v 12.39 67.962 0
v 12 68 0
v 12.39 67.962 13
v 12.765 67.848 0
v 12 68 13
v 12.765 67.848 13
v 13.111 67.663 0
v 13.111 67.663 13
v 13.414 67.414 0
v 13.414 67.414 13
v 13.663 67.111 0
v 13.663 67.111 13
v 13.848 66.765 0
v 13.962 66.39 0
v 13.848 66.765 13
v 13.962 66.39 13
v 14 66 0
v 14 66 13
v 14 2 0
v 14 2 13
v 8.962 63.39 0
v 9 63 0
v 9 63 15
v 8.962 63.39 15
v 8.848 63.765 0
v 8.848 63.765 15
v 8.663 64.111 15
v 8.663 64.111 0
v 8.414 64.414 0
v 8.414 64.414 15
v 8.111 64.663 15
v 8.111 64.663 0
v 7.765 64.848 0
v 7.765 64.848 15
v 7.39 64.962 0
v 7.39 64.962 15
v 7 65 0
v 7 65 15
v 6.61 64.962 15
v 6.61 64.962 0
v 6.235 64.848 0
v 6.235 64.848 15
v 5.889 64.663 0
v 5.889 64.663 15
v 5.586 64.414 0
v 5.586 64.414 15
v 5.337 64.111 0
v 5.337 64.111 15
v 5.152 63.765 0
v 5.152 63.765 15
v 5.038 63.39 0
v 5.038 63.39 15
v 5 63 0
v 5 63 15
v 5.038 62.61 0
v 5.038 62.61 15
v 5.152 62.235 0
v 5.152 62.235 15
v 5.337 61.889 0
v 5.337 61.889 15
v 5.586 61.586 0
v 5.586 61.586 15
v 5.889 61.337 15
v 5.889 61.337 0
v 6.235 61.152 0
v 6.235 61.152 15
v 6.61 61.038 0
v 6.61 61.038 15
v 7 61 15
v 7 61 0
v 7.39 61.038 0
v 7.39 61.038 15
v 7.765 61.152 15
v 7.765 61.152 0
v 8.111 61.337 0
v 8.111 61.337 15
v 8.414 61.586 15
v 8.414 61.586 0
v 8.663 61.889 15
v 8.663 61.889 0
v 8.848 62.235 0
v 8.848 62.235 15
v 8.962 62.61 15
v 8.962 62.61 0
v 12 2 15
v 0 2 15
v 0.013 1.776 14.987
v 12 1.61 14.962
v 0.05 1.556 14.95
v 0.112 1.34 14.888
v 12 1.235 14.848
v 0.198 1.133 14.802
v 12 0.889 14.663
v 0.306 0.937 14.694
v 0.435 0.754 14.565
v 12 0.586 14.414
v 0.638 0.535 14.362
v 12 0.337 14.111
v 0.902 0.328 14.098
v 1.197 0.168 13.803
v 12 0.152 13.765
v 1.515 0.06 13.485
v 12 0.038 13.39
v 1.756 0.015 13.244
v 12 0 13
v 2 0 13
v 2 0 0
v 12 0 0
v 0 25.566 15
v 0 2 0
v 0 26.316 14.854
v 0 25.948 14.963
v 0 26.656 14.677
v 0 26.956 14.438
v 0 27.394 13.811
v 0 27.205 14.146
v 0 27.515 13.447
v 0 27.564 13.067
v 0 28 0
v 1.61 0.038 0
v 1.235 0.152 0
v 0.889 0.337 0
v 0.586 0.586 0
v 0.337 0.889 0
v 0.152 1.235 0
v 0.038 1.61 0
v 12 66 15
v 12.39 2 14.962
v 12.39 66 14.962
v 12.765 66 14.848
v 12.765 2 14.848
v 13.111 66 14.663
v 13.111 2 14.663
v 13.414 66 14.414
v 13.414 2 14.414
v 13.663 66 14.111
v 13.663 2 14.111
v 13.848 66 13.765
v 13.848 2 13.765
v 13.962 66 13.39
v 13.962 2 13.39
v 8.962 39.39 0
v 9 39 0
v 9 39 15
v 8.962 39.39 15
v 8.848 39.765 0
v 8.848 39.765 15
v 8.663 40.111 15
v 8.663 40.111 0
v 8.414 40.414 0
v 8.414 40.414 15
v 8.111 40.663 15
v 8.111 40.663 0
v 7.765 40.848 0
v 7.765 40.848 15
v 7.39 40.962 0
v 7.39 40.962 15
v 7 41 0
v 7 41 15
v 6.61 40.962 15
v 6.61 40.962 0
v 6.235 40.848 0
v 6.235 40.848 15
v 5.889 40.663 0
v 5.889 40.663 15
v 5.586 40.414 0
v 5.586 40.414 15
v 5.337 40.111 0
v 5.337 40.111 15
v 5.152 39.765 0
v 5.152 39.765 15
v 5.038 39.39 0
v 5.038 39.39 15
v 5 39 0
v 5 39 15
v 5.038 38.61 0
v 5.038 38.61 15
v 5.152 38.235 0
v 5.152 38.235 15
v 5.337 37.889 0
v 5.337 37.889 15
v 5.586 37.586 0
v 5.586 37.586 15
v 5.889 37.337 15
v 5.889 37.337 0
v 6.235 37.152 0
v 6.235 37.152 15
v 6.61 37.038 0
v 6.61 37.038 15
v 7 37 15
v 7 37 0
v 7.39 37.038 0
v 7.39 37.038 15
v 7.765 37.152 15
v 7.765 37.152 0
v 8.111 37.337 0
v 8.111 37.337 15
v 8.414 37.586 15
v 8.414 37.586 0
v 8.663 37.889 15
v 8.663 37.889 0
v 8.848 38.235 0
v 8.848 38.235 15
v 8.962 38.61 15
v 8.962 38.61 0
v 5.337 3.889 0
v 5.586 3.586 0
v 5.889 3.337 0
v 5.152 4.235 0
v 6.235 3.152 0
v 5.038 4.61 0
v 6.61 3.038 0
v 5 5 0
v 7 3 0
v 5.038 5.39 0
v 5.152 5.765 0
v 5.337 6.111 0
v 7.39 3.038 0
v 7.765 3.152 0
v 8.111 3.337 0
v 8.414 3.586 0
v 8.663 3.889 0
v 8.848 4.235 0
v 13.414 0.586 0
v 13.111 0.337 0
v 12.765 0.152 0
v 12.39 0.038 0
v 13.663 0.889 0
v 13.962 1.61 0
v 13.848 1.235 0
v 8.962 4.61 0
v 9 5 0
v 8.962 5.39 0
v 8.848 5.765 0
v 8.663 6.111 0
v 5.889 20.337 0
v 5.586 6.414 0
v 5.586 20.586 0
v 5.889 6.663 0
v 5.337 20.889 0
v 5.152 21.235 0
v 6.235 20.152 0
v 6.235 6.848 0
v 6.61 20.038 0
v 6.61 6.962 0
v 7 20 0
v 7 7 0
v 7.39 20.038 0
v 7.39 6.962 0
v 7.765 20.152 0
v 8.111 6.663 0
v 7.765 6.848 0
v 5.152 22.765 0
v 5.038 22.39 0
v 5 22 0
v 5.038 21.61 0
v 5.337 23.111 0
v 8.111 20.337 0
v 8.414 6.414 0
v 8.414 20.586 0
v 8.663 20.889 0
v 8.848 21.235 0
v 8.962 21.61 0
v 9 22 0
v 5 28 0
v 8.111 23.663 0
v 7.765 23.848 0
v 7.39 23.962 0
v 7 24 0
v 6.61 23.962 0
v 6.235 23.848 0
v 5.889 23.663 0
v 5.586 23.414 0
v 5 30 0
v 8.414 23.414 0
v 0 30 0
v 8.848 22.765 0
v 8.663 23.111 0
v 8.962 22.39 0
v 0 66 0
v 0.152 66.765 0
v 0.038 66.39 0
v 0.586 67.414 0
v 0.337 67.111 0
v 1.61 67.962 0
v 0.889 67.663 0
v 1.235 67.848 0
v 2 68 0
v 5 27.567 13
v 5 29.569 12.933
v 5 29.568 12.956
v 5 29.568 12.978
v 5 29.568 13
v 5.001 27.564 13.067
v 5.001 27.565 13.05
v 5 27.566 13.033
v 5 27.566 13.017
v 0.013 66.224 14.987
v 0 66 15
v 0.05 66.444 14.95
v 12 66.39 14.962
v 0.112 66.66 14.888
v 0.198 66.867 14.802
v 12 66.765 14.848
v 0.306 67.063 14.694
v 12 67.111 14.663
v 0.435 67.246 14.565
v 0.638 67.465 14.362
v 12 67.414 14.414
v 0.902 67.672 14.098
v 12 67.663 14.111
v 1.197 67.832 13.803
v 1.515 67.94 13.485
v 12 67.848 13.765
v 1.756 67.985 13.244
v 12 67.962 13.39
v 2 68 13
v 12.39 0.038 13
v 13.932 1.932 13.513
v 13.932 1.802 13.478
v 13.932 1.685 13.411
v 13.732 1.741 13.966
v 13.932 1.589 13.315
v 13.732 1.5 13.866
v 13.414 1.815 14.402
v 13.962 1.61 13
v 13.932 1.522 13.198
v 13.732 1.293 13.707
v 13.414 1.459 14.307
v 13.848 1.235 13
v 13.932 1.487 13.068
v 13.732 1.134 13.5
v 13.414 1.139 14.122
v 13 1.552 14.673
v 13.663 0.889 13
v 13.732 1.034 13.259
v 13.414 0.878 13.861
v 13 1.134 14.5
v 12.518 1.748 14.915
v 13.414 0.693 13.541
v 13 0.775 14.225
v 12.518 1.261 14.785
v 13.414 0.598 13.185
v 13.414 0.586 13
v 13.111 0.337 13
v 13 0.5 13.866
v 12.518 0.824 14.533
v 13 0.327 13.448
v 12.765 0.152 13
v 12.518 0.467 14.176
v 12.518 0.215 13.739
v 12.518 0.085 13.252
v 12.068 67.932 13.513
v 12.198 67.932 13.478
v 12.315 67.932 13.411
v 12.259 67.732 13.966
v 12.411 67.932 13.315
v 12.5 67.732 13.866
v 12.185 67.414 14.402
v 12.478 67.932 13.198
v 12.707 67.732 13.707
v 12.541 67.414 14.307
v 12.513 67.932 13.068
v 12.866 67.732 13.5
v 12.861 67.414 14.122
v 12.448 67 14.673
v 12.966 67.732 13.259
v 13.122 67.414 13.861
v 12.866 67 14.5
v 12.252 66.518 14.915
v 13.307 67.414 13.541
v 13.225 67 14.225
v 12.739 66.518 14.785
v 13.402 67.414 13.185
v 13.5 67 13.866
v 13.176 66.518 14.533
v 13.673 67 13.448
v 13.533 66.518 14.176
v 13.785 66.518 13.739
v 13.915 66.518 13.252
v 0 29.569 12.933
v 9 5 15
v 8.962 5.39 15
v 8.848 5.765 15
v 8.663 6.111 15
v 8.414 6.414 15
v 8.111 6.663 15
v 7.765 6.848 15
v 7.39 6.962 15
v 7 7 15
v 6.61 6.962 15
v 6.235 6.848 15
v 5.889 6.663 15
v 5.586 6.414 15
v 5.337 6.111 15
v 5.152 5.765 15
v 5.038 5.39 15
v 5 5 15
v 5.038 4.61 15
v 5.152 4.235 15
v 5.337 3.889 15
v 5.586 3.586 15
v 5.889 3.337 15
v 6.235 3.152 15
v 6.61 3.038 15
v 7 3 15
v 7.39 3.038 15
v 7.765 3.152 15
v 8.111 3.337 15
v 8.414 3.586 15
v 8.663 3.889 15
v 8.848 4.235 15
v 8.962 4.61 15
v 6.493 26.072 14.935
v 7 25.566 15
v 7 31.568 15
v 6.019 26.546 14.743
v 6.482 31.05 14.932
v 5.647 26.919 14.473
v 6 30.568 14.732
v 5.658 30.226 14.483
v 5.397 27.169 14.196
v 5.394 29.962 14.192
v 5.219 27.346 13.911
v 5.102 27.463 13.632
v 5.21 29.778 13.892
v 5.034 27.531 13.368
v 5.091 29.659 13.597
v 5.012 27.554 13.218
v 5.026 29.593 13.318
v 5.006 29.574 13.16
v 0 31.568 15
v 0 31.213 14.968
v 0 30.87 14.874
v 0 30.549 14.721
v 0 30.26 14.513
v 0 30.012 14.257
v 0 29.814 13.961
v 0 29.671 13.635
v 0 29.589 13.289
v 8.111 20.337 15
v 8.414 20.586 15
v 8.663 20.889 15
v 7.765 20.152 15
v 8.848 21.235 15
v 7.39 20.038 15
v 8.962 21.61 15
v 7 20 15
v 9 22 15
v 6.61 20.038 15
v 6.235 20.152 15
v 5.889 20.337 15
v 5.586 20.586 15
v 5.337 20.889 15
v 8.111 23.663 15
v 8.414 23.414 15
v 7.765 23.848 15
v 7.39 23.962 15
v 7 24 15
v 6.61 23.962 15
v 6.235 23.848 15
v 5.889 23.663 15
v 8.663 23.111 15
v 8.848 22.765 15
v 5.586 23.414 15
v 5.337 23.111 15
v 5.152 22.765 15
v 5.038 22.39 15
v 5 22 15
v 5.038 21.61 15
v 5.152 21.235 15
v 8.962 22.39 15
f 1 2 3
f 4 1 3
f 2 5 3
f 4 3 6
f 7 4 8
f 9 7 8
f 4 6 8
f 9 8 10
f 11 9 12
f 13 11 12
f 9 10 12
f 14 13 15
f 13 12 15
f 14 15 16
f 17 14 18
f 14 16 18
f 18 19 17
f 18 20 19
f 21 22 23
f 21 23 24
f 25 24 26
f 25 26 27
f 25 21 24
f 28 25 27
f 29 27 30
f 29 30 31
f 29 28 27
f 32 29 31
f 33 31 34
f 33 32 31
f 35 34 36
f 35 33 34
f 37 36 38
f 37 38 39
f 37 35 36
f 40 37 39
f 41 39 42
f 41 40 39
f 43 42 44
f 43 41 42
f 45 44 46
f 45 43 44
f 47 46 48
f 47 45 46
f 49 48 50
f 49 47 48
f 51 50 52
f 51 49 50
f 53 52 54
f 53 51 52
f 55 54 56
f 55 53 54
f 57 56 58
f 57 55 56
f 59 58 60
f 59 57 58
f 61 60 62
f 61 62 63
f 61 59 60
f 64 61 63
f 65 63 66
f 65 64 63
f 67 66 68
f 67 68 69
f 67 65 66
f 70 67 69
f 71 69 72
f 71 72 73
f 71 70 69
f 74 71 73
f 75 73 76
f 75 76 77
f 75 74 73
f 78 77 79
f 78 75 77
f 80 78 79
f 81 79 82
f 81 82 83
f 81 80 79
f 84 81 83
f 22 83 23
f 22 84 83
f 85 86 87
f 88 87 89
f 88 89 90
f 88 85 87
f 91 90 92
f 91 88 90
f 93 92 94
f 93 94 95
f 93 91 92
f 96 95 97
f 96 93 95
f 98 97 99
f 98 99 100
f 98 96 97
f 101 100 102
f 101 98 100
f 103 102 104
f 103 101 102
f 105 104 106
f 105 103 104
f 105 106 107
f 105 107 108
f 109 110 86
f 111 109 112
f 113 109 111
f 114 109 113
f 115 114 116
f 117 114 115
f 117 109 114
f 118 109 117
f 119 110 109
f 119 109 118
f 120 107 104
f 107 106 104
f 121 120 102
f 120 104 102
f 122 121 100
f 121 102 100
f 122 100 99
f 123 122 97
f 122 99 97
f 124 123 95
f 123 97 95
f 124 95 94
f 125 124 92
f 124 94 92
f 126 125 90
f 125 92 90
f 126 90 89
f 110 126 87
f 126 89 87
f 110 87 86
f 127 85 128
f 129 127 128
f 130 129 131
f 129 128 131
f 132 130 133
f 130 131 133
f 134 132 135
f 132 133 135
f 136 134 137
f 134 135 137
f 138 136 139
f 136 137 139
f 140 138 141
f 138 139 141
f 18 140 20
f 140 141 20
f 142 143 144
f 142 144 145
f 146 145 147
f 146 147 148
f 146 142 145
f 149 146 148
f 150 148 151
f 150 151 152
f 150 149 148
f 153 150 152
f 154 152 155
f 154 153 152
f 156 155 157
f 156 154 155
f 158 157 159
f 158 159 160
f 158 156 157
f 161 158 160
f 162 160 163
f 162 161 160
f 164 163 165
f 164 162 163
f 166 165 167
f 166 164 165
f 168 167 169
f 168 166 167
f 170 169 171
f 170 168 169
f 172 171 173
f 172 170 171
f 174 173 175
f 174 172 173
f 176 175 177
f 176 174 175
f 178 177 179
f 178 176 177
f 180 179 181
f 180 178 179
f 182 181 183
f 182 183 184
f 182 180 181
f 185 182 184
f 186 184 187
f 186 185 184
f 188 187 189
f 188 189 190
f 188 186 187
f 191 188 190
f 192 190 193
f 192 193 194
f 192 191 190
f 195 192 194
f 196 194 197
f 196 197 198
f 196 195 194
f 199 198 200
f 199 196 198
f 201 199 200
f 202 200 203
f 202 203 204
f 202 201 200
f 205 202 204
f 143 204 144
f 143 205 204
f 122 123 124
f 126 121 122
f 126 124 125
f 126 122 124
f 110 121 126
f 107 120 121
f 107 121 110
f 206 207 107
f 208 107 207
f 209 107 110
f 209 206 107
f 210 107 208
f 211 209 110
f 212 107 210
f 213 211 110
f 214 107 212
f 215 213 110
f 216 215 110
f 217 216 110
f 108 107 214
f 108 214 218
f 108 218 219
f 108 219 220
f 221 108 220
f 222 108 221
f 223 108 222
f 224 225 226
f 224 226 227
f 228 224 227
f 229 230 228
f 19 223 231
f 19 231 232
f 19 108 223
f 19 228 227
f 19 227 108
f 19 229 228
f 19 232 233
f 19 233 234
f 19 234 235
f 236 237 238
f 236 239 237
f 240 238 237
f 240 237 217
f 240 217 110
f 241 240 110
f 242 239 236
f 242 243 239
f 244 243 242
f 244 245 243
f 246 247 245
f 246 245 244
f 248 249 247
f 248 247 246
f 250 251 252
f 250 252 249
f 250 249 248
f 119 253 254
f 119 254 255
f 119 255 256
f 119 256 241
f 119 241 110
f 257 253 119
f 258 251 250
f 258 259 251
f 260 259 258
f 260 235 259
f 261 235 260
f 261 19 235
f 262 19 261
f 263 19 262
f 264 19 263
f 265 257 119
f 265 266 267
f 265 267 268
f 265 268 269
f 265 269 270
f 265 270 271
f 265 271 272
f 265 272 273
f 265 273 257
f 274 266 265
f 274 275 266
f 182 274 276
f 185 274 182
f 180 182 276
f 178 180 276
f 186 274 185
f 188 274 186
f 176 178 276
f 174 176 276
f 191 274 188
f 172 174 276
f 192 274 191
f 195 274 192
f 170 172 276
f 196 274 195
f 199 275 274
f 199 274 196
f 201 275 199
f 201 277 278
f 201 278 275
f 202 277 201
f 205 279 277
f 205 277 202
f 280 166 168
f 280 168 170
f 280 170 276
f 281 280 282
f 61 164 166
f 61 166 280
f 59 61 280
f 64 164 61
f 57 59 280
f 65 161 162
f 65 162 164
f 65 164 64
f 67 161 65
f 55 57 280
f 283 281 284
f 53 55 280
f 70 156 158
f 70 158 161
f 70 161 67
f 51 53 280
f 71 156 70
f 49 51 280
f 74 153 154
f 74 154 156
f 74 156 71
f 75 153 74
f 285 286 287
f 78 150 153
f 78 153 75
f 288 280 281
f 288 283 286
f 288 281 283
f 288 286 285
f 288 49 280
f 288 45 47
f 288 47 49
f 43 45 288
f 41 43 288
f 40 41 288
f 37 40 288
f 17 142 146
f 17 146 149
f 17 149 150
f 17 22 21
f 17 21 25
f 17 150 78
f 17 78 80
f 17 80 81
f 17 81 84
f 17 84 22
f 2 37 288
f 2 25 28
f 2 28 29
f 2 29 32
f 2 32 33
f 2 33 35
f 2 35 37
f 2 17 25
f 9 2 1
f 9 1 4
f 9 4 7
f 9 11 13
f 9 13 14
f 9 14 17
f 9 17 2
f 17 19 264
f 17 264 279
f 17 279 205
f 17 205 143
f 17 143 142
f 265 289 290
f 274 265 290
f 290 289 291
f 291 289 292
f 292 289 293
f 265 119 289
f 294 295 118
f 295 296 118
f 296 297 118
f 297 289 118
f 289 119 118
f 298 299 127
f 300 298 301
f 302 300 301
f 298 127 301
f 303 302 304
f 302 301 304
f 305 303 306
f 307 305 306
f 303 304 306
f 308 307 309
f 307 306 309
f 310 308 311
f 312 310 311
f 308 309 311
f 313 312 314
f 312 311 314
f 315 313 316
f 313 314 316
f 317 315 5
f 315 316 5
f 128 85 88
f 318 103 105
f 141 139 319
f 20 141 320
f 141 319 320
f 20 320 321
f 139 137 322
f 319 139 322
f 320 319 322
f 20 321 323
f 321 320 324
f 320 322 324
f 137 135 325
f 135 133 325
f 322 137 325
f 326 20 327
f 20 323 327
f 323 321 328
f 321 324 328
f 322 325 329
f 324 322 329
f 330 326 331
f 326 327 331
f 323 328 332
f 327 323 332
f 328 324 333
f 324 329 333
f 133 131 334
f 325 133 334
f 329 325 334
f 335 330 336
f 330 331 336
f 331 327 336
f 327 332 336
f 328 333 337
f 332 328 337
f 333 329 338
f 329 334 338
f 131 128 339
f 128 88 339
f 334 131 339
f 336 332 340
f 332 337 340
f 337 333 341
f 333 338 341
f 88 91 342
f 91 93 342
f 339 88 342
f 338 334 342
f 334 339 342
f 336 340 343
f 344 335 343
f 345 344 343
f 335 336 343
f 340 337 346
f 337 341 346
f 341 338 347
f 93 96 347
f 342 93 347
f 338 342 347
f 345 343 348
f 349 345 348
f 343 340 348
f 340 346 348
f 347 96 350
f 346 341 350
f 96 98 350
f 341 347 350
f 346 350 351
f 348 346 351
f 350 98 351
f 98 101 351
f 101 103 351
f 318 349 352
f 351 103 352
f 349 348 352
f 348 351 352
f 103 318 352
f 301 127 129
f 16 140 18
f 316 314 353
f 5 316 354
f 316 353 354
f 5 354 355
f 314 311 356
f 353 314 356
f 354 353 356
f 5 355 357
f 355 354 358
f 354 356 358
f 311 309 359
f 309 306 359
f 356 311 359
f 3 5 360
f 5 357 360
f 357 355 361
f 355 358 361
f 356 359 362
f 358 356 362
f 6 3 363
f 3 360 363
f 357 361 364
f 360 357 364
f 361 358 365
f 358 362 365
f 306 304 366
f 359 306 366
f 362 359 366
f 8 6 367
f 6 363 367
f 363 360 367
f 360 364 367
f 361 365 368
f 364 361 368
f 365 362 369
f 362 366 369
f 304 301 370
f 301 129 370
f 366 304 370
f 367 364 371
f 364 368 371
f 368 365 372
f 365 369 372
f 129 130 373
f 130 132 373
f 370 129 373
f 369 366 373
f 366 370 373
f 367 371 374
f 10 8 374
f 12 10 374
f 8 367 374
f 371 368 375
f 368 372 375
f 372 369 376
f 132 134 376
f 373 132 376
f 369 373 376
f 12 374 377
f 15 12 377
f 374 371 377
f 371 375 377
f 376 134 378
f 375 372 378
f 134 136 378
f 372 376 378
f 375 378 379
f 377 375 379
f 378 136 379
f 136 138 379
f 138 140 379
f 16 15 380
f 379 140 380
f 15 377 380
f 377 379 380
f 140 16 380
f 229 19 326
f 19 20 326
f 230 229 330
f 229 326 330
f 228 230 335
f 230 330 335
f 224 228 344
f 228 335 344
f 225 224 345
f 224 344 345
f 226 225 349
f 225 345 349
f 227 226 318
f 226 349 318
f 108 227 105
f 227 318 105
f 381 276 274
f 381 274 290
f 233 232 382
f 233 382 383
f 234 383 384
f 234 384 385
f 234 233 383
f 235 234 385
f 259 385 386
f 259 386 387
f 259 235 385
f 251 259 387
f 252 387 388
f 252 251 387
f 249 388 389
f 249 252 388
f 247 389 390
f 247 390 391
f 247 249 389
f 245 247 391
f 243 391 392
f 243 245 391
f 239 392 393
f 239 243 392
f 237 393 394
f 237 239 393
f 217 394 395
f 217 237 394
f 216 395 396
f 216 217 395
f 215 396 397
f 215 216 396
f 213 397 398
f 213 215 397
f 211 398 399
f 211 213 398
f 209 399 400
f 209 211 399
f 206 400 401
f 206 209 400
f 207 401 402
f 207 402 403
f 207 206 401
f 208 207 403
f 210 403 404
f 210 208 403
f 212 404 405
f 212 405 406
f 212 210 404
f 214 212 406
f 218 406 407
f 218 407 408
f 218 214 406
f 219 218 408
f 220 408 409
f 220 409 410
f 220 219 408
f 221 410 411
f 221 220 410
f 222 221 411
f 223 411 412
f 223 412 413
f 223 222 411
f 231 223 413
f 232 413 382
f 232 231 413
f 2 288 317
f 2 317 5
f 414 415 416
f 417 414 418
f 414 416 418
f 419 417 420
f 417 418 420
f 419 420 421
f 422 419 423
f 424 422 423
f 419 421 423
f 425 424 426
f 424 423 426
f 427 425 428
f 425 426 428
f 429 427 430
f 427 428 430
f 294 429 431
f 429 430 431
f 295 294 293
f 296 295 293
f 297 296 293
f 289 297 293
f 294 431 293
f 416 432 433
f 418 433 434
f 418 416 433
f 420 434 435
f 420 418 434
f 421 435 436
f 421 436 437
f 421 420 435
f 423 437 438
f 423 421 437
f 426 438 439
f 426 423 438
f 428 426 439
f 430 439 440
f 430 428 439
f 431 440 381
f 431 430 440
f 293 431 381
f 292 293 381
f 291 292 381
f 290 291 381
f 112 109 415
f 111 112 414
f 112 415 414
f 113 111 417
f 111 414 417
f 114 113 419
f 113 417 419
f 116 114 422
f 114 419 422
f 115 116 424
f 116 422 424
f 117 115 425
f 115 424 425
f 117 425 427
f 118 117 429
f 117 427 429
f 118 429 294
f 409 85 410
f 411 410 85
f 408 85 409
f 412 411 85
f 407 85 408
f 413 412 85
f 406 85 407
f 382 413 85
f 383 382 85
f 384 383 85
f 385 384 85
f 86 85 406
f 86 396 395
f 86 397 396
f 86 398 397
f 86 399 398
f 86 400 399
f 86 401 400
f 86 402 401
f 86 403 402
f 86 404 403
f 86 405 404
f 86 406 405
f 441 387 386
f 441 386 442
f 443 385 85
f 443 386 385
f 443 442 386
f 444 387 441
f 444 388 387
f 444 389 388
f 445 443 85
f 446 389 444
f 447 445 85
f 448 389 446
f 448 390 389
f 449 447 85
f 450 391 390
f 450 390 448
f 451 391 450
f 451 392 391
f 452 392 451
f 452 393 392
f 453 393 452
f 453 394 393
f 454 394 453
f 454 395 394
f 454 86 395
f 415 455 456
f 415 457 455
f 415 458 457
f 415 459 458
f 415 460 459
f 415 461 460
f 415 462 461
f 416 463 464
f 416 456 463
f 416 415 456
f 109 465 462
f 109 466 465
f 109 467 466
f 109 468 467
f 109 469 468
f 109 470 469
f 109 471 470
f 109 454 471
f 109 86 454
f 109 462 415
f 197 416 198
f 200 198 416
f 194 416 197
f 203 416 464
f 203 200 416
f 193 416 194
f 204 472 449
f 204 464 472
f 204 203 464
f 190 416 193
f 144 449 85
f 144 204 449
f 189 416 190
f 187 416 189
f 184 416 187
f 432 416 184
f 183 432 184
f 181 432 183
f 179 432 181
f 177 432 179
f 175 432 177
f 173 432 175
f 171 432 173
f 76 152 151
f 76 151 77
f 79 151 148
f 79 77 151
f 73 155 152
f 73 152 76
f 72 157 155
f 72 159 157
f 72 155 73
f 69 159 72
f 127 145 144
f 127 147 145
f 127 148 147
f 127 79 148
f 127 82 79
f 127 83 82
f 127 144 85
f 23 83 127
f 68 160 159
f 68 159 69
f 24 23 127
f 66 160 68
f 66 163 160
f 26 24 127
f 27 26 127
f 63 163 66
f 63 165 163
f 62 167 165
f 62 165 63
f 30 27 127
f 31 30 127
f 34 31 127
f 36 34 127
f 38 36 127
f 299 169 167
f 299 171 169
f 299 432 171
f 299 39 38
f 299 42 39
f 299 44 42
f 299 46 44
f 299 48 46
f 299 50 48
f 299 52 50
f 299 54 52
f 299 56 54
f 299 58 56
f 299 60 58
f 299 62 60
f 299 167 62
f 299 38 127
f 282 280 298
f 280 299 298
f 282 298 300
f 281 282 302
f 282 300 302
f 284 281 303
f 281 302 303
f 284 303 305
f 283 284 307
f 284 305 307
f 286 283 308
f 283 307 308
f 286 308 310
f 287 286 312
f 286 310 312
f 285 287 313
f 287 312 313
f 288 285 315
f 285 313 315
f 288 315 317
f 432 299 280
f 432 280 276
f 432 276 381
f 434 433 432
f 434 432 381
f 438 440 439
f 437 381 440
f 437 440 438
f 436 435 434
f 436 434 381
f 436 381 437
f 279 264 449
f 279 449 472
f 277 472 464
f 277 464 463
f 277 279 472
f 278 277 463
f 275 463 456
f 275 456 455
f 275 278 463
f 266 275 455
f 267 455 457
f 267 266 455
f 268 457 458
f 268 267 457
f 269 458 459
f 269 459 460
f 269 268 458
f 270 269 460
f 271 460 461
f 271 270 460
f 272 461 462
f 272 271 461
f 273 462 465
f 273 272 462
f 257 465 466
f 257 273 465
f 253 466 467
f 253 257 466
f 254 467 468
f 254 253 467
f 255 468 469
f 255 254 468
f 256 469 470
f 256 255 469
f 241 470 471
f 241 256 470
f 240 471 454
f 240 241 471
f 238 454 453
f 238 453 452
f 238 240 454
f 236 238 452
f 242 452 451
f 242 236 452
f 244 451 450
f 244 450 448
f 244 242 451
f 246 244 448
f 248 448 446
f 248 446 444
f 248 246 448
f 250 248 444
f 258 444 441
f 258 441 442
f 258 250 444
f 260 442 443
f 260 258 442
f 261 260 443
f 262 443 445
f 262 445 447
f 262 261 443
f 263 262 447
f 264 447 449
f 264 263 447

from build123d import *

# Parameters (mm, degrees)
F0_W     = 14
F0_H     = 28
F0_R     = 2
F1_DEPTH = 15
F0_H_2   = 38
F2_W     = 2.6328479201
F2_H     = 15
F3_DEPTH = 9
F5_DEPTH = 5
F7_DEPTH = 5
F8_R     = 2


with BuildPart() as f1:
    # F0 (on Top) → F1 (new body)
    with BuildSketch(Plane.XY):
        with Locations((7, 14)):
            Rectangle(F0_W, F0_H)
        with Locations((7, 5)):
            Circle(F0_R, mode=Mode.SUBTRACT)
        with Locations((7, 22)):
            Circle(F0_R, mode=Mode.SUBTRACT)
    extrude(amount=F1_DEPTH)



with BuildPart() as f1b:
    # F0 (on Top) → F1, piece 2 (new body)
    with BuildSketch(Plane.XY):
        with Locations((7, 49)):
            Rectangle(F0_W, F0_H_2)
        with Locations((7, 39)):
            Circle(F0_R, mode=Mode.SUBTRACT)
        with Locations((7, 63)):
            Circle(F0_R, mode=Mode.SUBTRACT)
    extrude(amount=F1_DEPTH)


with BuildPart() as f1_1:
    add(f1.part)

    add(f1b.part)  # F3 merges F1b
    # F2 (on face) → F3 (join)
    with BuildSketch(Plane.YZ.offset(14)):
        with Locations((29.31642396, 7.5)):
            Rectangle(F2_W, F2_H)
    extrude(amount=-F3_DEPTH)

    # F4 (on face) → F5 (cut)
    with BuildSketch(Plane(origin=(0, 0, 0), x_dir=(0, -1, 0), z_dir=(-1, 0, 0))):
        Polygon((-28, 15), (-28, 0), (-27.5, 15), align=None)
    extrude(amount=-F5_DEPTH, mode=Mode.SUBTRACT)

    # F6 (on face) → F7 (join)
    with BuildSketch(Plane(origin=(0, 0, 0), x_dir=(0, -1, 0), z_dir=(-1, 0, 0))):
        Polygon((-29.5, 15), (-30, 15), (-30, 0), align=None)
    extrude(amount=-F7_DEPTH)

    # F8
    f8_edges = [f1_1.edges().sort_by_distance(p)[0] for p in [
        (2.5, 29.5, 15),
        (5, 28.5, 15),
        (2.5, 27.5, 15),
        (7, 0, 15),
        (14, 34, 15),
        (7, 68, 15),
        (14, 0, 7.5),
        (14, 68, 7.5),
        (0, 68, 7.5),
        (0, 0, 7.5),
    ]]
    fillet(f8_edges, radius=F8_R)


solid = f1_1.part
